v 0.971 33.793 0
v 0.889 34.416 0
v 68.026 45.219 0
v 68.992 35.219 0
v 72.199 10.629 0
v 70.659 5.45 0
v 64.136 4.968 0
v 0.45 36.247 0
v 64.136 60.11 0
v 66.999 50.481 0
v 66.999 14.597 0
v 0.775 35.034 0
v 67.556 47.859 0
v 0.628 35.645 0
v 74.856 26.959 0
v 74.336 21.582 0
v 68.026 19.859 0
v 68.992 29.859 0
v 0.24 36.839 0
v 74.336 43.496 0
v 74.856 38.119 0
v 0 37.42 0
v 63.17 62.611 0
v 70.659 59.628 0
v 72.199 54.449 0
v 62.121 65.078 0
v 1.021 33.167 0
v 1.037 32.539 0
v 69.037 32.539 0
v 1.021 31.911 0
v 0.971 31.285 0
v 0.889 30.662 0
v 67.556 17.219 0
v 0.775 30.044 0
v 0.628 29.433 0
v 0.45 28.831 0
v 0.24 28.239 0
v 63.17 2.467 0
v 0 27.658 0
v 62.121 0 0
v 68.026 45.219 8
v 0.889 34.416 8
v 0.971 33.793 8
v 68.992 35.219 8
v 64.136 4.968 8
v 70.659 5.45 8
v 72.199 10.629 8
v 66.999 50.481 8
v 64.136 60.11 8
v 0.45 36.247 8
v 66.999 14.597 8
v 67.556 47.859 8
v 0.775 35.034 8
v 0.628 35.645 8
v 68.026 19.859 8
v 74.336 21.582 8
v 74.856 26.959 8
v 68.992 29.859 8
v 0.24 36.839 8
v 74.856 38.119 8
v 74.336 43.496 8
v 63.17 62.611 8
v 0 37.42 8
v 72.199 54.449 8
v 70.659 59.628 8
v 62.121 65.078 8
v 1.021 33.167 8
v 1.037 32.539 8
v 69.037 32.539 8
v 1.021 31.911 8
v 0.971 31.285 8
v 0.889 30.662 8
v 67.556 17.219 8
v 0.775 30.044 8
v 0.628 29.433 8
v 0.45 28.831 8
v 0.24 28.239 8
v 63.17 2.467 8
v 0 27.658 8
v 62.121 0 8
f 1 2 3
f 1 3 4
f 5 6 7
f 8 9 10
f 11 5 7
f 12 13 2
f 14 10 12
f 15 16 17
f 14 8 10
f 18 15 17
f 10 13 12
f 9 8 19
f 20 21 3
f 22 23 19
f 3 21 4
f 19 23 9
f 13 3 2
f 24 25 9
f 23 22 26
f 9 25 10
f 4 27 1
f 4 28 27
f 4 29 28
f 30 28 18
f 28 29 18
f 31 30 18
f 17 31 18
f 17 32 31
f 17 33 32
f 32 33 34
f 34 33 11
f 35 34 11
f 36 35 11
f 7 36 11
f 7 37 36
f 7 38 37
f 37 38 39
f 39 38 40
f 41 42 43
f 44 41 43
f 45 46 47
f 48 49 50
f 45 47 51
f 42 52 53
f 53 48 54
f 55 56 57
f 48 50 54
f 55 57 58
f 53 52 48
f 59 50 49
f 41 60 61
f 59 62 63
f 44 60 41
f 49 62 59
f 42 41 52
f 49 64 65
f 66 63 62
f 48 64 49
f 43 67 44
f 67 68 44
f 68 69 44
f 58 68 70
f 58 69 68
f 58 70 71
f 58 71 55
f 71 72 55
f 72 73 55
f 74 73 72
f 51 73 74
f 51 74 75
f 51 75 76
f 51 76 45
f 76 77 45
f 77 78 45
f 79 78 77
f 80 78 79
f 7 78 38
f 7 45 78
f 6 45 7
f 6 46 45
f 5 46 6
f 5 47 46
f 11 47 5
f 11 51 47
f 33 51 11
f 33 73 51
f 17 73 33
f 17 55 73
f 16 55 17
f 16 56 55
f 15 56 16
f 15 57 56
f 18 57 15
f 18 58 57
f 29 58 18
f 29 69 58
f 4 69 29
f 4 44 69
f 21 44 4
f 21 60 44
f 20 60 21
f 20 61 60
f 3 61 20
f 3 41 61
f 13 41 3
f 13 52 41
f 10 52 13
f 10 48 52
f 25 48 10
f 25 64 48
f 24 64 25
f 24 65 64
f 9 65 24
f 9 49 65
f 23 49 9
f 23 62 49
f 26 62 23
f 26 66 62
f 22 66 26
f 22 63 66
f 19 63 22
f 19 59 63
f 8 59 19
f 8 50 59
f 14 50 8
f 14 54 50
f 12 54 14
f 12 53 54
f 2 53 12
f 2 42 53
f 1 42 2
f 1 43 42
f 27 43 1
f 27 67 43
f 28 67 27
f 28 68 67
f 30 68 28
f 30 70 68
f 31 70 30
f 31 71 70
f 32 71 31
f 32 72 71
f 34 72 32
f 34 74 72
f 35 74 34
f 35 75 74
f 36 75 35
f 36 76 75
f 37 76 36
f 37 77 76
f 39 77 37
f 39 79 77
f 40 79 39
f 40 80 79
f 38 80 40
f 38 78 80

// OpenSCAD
$fn = 32;

// ----------------------------------------------------------------------
// Gear sector: 4 teeth on 48 degrees
// ----------------------------------------------------------------------

// --- parameters (mm) ---
sector_angle = 48;        // sector angle, degrees
root_r = 80;              // root circle radius
tooth_h = 6;              // tooth height over the root circle
teeth = 4;                // number of teeth on the sector
hub_r = 12;               // hub bore radius
plate_t = 8;              // sector thickness, Z
arc_step = 3;             // sampling step of the root/hub arcs, degrees
fit_tol = 0.1;            // declared fit tolerance (prompt contract)
free_tol = 0.3;           // declared free tolerance (prompt contract)

tip_r = root_r + tooth_h;  // tip circle radius

profile = [[62.121, 0], [63.17, 2.467], [64.136, 4.968], [70.659, 5.45], [72.199, 10.629], [66.999, 14.597], [67.556, 17.219], [68.026, 19.859], [74.336, 21.582], [74.856, 26.959], [68.992, 29.859], [69.037, 32.539], [68.992, 35.219], [74.856, 38.119], [74.336, 43.496], [68.026, 45.219], [67.556, 47.859], [66.999, 50.481], [72.199, 54.449], [70.659, 59.628], [64.136, 60.11], [63.17, 62.611], [62.121, 65.078], [0, 37.42], [0.24, 36.839], [0.45, 36.247], [0.628, 35.645], [0.775, 35.034], [0.889, 34.416], [0.971, 33.793], [1.021, 33.167], [1.037, 32.539], [1.021, 31.911], [0.971, 31.285], [0.889, 30.662], [0.775, 30.044], [0.628, 29.433], [0.45, 28.831], [0.24, 28.239], [0, 27.658]];  // primary outline, 40 points, counter clockwise

// --- the one profile operation ---
linear_extrude(height = plate_t) polygon(points = profile);
